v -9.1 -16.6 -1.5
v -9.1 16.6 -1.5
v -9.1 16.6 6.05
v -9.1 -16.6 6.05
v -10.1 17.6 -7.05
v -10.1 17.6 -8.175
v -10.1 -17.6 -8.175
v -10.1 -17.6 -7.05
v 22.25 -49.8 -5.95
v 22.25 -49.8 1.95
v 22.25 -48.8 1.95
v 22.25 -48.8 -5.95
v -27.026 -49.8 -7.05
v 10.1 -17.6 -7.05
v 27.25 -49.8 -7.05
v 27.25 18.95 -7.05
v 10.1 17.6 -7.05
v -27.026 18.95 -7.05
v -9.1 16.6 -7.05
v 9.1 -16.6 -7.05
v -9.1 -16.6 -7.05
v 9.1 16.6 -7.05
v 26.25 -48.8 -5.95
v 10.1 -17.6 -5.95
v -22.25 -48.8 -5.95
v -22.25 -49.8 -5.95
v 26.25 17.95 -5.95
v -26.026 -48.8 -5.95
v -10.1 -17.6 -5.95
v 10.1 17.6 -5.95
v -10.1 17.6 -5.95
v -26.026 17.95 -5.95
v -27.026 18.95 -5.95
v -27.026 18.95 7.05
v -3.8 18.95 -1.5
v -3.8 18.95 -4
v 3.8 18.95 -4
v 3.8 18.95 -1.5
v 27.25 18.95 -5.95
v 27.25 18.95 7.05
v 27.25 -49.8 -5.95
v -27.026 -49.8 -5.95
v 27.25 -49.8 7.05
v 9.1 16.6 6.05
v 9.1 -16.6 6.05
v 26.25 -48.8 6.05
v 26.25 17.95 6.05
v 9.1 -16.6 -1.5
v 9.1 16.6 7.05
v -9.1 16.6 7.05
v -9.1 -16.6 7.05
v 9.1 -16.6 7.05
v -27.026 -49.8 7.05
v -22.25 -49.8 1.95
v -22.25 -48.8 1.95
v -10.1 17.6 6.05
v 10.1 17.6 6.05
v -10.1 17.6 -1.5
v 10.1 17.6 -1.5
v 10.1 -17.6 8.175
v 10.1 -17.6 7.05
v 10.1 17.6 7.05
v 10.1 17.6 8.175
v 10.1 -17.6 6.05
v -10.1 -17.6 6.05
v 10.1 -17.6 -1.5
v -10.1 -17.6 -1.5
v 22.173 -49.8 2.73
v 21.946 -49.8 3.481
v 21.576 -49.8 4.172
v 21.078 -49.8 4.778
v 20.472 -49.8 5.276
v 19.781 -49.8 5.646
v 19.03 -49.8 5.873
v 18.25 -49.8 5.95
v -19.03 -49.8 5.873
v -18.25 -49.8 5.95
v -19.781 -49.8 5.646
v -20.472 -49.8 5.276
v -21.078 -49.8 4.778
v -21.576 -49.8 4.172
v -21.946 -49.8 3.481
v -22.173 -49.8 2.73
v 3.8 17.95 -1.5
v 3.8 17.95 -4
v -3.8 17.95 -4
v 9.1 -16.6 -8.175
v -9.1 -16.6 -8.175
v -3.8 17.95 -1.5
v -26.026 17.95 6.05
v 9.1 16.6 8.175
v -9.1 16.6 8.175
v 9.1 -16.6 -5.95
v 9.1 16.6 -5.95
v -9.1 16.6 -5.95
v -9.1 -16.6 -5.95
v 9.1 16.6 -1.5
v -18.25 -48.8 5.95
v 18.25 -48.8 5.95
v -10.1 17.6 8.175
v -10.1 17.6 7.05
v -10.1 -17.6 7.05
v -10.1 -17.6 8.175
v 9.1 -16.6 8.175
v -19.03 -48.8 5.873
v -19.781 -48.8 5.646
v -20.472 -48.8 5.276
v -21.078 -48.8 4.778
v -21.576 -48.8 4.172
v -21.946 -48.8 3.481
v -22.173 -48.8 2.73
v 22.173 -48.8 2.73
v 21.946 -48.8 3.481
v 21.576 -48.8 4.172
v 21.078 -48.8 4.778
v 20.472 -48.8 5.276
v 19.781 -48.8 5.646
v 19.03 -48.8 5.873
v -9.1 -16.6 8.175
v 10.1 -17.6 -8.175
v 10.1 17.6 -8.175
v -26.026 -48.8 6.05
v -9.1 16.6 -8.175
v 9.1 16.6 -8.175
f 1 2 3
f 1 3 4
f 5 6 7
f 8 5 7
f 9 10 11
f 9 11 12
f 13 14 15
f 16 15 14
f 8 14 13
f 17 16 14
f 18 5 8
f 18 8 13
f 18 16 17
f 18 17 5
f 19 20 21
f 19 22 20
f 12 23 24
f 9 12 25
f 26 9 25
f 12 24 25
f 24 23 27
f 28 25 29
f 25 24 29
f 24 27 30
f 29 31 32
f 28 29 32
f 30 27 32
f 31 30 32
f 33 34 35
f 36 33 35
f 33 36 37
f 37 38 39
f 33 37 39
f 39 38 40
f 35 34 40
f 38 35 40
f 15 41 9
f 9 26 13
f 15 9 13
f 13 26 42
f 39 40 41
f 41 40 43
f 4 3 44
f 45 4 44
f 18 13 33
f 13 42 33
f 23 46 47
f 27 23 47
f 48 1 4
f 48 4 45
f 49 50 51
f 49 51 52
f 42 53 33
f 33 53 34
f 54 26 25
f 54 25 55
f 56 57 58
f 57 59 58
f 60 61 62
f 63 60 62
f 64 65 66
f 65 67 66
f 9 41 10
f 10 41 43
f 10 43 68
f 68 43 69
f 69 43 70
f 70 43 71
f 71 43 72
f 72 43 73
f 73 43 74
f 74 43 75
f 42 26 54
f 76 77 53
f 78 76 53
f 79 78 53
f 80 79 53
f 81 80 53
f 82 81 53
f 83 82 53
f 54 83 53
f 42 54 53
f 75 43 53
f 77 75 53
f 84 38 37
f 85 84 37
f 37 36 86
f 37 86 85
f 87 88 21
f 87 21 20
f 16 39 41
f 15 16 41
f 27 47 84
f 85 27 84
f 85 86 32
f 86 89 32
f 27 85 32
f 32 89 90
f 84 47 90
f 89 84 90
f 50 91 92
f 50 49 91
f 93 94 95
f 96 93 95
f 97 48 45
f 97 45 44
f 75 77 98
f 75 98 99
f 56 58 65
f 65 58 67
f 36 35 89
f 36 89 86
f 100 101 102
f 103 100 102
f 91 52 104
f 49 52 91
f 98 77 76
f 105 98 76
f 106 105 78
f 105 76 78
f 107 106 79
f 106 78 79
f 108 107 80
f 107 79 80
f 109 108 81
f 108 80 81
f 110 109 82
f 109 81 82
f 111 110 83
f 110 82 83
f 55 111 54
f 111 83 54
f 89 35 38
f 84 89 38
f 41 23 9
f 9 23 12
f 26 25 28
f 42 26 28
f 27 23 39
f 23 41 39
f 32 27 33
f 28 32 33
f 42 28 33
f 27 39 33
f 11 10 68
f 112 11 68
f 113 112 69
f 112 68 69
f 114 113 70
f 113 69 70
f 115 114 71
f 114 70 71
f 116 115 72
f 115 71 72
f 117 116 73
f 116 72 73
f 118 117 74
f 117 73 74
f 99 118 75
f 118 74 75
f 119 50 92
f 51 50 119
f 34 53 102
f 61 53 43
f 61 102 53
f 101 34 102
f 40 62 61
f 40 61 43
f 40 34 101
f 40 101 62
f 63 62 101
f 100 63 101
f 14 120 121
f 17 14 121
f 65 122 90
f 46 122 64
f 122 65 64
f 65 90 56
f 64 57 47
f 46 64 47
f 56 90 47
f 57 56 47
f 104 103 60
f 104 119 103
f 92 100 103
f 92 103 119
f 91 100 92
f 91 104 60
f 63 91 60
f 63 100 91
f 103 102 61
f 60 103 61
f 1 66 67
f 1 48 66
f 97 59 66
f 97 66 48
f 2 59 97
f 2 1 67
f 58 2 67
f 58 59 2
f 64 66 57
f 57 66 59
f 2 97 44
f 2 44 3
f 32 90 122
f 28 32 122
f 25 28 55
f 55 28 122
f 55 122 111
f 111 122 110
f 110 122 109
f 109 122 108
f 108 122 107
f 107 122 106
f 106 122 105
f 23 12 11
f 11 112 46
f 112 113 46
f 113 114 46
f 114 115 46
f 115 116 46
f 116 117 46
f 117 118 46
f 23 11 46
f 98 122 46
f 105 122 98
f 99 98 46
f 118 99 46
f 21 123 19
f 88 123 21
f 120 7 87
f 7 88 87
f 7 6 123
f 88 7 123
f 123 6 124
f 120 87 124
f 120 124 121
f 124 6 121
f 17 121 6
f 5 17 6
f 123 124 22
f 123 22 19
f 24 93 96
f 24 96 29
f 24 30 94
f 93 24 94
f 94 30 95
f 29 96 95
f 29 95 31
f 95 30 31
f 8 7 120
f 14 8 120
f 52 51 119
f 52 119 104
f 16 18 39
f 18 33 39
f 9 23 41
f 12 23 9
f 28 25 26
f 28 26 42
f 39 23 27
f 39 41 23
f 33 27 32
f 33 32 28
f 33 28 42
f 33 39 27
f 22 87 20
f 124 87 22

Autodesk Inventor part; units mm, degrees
ref_plane "YZ Plane" through (0, 0, 0) normal (1, 0, 0) x (0, 1, 0)
sketch "Sketch1" plane through (0, 0, 0) normal (0, 0, 1) x (1, 0, 0)
  line L0 (-9, 16.5) -> (9, 16.5) construction
  line L1 (9, 16.5) -> (9, -16.5) construction
  line L2 (-9, -16.5) -> (-9, 16.5) construction
  line L3 (9, -16.5) -> (-9, -16.5) construction
  line L4 (9.1, 16.6) -> (-9.1, 16.6)
  line L5 (-9.1, 16.6) -> (-9.1, -16.6)
  line L6 (-9.1, -16.6) -> (9.1, -16.6)
  line L7 (9.1, -16.6) -> (9.1, 16.6)
  line L8 (10.1, 17.6) -> (-10.1, 17.6)
  line L9 (-10.1, 17.6) -> (-10.1, -17.6)
  line L10 (-10.1, -17.6) -> (10.1, -17.6)
  line L11 (10.1, -17.6) -> (10.1, 17.6)
  point P0 (0, 0)
  dimension "d0" = 0.1
  dimension "d1" = 1
extrude "Extrusion1" add sketch "Sketch1" along normal mid plane 16.35
sketch "Sketch2" plane through (-10.1, -17.6, 8.175) normal (0, -1, 0) x (1, 0, 0)
  point P0 (10.1, -8.175)
  point P1 (10.1, -8.175)
ref_plane "Work Plane1" through (-18.25, -49.8, 6.05) normal (0, 0, 1) x (1, 0, 0)
sketch "Sketch3" plane through (-18.25, -49.8, 6.05) normal (0, 0, 1) x (1, 0, 0)
  line L0 (36.5, 14) -> (0, 14) construction
  line L1 (36.5, 14) -> (36.5, 22.2) construction
  line L2 (0, 22.2) -> (36.5, 22.2) construction
  line L3 (0, 14) -> (0, 22.2) construction
  line L4 (40.5, 0) -> (-4, 0) construction
  line L5 (-4, 0) -> (-4, 14) construction
  line L6 (40.5, 14) -> (-4, 14) construction
  line L7 (40.5, 0) -> (40.5, 14) construction
  line L8 (40.5, 0) -> (-4, 0)
  line L9 (-4, 0) -> (-8.7761, 0)
  line L10 (40.5, 0) -> (45.5, 0)
  line L11 (45.5, 0) -> (45.5, 67.4)
  line L12 (-8.7761, 67.4) -> (-8.7761, 0)
  line L13 (14.45, 68.75) -> (22.05, 68.75) construction
  line L14 (-8.7761, 67.4) -> (-8.7761, 68.75)
  line L15 (-8.7761, 68.75) -> (45.5, 68.75)
  line L16 (45.5, 68.75) -> (45.5, 67.4)
  point P0 (18.25, 49.8)
  dimension "d4" = 5
extrude "Extrusion2" add sketch "Sketch3" along normal blind 1
sketch "Sketch4" plane through (-18.25, -49.8, 6.05) normal (0, 0, -1) x (-1, 0, 0)
  line L0 (-27.35, 33.2) -> (-27.35, 66.4) projected
  line L1 (-27.35, 66.4) -> (-9.15, 66.4) projected
  line L2 (-9.15, 66.4) -> (-9.15, 33.2) projected
  line L3 (-9.15, 33.2) -> (-27.35, 33.2) projected
  line L4 (-8.15, 67.4) -> (-28.35, 67.4) projected
  line L5 (-28.35, 67.4) -> (-28.35, 32.2) projected
  line L6 (-28.35, 32.2) -> (-8.15, 32.2) projected
  line L7 (-8.15, 32.2) -> (-8.15, 67.4) projected
  point P0 (-18.25, 49.8)
extrude "Extrusion3" [suppressed]
sketch "Sketch5" plane through (-18.25, -49.8, 6.05) normal (0, 0, -1) x (-1, 0, 0)
  line L0 (8.7761, 68.75) -> (-45.5, 68.75) projected
  line L1 (-45.5, 68.75) -> (-45.5, 0) projected
  line L2 (8.7761, 0) -> (8.7761, 68.75) projected
  line L3 (-45.5, 0) -> (8.7761, 0) projected
  line L4 (-44.5, 67.75) -> (7.7761, 67.75)
  line L5 (7.7761, 67.75) -> (7.7761, 1)
  line L6 (7.7761, 1) -> (-44.5, 1)
  line L7 (-44.5, 1) -> (-44.5, 67.75)
  point P0 (-18.25, 49.8)
  dimension "d9" = 1
ref_plane "Work Plane2" through (-22.25, -49.8, -5.95) normal (0, 0, -1) x (0, 1, 0)
extrude "Extrusion4" add sketch "Sketch5" along normal up to surface (12 mm away)
sketch "Sketch6" plane through (-27.0261, -49.8, 7.05) normal (0, -1, 0) x (1, 0, 0)
  arc A0 (8.7761, -1.1) -> (4.7761, -5.1) centre (8.7761, -5.1) ccw projected
  line L0 (4.7761, -13) -> (4.7761, -5.1) projected
  line L1 (8.7761, -1.1) -> (45.2761, -1.1) projected
  arc A1 (49.2761, -5.1) -> (45.2761, -1.1) centre (45.2761, -5.1) ccw projected
  line L2 (49.2761, -5.1) -> (49.2761, -13) projected
  line L3 (0, -13) -> (54.2761, -13) construction
  line L4 (49.2761, -13) -> (4.7761, -13)
  line L5 (54.2761, -13) -> (0, -13) projected
  point P0 (27.0261, -7.05)
extrude "Extrusion5" cut sketch "Sketch6" against normal blind 1
ref_plane "Work Plane3" through (27.25, 18.95, -6.05) normal (0, 0, -1) x (-1, 0, 0)
sketch "Sketch7" plane through (27.25, 18.95, -6.05) normal (0, 0, -1) x (-1, 0, 0)
  line L0 (54.2761, 0) -> (54.2761, -68.75) projected
  line L1 (0, 0) -> (54.2761, 0) projected
  line L2 (0, -68.75) -> (0, 0) projected
  line L3 (5, -68.75) -> (0, -68.75) projected
  line L4 (54.2761, -68.75) -> (49.5, -68.75) projected
  line L5 (5, -68.75) -> (49.5, -68.75)
  line L6 (9, -67.75) -> (45.5, -67.75) projected
  point P0 (27.25, -18.95)
extrude "Extrusion6" add sketch "Sketch7" along normal blind 1 and the other way blind 0.1
sketch "Sketch8" plane through (-27.0261, 18.95, 7.05) normal (0, 1, 0) x (1, 0, 0)
  line L0 (23.2261, 11.05) -> (30.8261, 11.05) projected
  line L1 (23.2261, 8.55) -> (23.2261, 11.05) projected
  line L2 (30.8261, 8.55) -> (30.8261, 11.05) projected
  line L3 (23.2261, 8.55) -> (30.8261, 8.55) projected
  point P0 (27.0261, 7.05)
extrude "Extrusion7" cut sketch "Sketch8" against normal blind 1
ref_plane "Work Plane4" through (27.25, 18.95, -5.95) normal (0, 0, -1) x (-1, 0, 0)
split body "Split1" result two bodies by plane through (27.25, 18.95, -5.95) normal (0, 0, -1) first body at (3.4413, -39.0667, -6.55)
sketch "Sketch9" plane through (0, 0, -8.175) normal (0, 0, -1) x (-1, 0, 0)
  line L0 (-9.1, -16.6) -> (-9.1, 16.6) projected
  line L1 (-9.1, 16.6) -> (9.1, 16.6) projected
  line L2 (9.1, 16.6) -> (9.1, -16.6) projected
  line L3 (9.1, -16.6) -> (-9.1, -16.6) projected
  line L4 (10.1, 17.6) -> (-10.1, 17.6) projected
  line L5 (-10.1, 17.6) -> (-10.1, -17.6) projected
  line L6 (-10.1, -17.6) -> (10.1, -17.6) projected
  line L7 (10.1, -17.6) -> (10.1, 17.6) projected
  point P0 (0, 0)
ref_plane "Work Plane5" through (-9, -16.5, -1.5) normal (0, 0, -1) x (0, 1, 0)
extrude "Extrusion8" cut sketch "Sketch9" against normal up to surface (6.675 mm away) bodies 3
properties part number "box_low"
